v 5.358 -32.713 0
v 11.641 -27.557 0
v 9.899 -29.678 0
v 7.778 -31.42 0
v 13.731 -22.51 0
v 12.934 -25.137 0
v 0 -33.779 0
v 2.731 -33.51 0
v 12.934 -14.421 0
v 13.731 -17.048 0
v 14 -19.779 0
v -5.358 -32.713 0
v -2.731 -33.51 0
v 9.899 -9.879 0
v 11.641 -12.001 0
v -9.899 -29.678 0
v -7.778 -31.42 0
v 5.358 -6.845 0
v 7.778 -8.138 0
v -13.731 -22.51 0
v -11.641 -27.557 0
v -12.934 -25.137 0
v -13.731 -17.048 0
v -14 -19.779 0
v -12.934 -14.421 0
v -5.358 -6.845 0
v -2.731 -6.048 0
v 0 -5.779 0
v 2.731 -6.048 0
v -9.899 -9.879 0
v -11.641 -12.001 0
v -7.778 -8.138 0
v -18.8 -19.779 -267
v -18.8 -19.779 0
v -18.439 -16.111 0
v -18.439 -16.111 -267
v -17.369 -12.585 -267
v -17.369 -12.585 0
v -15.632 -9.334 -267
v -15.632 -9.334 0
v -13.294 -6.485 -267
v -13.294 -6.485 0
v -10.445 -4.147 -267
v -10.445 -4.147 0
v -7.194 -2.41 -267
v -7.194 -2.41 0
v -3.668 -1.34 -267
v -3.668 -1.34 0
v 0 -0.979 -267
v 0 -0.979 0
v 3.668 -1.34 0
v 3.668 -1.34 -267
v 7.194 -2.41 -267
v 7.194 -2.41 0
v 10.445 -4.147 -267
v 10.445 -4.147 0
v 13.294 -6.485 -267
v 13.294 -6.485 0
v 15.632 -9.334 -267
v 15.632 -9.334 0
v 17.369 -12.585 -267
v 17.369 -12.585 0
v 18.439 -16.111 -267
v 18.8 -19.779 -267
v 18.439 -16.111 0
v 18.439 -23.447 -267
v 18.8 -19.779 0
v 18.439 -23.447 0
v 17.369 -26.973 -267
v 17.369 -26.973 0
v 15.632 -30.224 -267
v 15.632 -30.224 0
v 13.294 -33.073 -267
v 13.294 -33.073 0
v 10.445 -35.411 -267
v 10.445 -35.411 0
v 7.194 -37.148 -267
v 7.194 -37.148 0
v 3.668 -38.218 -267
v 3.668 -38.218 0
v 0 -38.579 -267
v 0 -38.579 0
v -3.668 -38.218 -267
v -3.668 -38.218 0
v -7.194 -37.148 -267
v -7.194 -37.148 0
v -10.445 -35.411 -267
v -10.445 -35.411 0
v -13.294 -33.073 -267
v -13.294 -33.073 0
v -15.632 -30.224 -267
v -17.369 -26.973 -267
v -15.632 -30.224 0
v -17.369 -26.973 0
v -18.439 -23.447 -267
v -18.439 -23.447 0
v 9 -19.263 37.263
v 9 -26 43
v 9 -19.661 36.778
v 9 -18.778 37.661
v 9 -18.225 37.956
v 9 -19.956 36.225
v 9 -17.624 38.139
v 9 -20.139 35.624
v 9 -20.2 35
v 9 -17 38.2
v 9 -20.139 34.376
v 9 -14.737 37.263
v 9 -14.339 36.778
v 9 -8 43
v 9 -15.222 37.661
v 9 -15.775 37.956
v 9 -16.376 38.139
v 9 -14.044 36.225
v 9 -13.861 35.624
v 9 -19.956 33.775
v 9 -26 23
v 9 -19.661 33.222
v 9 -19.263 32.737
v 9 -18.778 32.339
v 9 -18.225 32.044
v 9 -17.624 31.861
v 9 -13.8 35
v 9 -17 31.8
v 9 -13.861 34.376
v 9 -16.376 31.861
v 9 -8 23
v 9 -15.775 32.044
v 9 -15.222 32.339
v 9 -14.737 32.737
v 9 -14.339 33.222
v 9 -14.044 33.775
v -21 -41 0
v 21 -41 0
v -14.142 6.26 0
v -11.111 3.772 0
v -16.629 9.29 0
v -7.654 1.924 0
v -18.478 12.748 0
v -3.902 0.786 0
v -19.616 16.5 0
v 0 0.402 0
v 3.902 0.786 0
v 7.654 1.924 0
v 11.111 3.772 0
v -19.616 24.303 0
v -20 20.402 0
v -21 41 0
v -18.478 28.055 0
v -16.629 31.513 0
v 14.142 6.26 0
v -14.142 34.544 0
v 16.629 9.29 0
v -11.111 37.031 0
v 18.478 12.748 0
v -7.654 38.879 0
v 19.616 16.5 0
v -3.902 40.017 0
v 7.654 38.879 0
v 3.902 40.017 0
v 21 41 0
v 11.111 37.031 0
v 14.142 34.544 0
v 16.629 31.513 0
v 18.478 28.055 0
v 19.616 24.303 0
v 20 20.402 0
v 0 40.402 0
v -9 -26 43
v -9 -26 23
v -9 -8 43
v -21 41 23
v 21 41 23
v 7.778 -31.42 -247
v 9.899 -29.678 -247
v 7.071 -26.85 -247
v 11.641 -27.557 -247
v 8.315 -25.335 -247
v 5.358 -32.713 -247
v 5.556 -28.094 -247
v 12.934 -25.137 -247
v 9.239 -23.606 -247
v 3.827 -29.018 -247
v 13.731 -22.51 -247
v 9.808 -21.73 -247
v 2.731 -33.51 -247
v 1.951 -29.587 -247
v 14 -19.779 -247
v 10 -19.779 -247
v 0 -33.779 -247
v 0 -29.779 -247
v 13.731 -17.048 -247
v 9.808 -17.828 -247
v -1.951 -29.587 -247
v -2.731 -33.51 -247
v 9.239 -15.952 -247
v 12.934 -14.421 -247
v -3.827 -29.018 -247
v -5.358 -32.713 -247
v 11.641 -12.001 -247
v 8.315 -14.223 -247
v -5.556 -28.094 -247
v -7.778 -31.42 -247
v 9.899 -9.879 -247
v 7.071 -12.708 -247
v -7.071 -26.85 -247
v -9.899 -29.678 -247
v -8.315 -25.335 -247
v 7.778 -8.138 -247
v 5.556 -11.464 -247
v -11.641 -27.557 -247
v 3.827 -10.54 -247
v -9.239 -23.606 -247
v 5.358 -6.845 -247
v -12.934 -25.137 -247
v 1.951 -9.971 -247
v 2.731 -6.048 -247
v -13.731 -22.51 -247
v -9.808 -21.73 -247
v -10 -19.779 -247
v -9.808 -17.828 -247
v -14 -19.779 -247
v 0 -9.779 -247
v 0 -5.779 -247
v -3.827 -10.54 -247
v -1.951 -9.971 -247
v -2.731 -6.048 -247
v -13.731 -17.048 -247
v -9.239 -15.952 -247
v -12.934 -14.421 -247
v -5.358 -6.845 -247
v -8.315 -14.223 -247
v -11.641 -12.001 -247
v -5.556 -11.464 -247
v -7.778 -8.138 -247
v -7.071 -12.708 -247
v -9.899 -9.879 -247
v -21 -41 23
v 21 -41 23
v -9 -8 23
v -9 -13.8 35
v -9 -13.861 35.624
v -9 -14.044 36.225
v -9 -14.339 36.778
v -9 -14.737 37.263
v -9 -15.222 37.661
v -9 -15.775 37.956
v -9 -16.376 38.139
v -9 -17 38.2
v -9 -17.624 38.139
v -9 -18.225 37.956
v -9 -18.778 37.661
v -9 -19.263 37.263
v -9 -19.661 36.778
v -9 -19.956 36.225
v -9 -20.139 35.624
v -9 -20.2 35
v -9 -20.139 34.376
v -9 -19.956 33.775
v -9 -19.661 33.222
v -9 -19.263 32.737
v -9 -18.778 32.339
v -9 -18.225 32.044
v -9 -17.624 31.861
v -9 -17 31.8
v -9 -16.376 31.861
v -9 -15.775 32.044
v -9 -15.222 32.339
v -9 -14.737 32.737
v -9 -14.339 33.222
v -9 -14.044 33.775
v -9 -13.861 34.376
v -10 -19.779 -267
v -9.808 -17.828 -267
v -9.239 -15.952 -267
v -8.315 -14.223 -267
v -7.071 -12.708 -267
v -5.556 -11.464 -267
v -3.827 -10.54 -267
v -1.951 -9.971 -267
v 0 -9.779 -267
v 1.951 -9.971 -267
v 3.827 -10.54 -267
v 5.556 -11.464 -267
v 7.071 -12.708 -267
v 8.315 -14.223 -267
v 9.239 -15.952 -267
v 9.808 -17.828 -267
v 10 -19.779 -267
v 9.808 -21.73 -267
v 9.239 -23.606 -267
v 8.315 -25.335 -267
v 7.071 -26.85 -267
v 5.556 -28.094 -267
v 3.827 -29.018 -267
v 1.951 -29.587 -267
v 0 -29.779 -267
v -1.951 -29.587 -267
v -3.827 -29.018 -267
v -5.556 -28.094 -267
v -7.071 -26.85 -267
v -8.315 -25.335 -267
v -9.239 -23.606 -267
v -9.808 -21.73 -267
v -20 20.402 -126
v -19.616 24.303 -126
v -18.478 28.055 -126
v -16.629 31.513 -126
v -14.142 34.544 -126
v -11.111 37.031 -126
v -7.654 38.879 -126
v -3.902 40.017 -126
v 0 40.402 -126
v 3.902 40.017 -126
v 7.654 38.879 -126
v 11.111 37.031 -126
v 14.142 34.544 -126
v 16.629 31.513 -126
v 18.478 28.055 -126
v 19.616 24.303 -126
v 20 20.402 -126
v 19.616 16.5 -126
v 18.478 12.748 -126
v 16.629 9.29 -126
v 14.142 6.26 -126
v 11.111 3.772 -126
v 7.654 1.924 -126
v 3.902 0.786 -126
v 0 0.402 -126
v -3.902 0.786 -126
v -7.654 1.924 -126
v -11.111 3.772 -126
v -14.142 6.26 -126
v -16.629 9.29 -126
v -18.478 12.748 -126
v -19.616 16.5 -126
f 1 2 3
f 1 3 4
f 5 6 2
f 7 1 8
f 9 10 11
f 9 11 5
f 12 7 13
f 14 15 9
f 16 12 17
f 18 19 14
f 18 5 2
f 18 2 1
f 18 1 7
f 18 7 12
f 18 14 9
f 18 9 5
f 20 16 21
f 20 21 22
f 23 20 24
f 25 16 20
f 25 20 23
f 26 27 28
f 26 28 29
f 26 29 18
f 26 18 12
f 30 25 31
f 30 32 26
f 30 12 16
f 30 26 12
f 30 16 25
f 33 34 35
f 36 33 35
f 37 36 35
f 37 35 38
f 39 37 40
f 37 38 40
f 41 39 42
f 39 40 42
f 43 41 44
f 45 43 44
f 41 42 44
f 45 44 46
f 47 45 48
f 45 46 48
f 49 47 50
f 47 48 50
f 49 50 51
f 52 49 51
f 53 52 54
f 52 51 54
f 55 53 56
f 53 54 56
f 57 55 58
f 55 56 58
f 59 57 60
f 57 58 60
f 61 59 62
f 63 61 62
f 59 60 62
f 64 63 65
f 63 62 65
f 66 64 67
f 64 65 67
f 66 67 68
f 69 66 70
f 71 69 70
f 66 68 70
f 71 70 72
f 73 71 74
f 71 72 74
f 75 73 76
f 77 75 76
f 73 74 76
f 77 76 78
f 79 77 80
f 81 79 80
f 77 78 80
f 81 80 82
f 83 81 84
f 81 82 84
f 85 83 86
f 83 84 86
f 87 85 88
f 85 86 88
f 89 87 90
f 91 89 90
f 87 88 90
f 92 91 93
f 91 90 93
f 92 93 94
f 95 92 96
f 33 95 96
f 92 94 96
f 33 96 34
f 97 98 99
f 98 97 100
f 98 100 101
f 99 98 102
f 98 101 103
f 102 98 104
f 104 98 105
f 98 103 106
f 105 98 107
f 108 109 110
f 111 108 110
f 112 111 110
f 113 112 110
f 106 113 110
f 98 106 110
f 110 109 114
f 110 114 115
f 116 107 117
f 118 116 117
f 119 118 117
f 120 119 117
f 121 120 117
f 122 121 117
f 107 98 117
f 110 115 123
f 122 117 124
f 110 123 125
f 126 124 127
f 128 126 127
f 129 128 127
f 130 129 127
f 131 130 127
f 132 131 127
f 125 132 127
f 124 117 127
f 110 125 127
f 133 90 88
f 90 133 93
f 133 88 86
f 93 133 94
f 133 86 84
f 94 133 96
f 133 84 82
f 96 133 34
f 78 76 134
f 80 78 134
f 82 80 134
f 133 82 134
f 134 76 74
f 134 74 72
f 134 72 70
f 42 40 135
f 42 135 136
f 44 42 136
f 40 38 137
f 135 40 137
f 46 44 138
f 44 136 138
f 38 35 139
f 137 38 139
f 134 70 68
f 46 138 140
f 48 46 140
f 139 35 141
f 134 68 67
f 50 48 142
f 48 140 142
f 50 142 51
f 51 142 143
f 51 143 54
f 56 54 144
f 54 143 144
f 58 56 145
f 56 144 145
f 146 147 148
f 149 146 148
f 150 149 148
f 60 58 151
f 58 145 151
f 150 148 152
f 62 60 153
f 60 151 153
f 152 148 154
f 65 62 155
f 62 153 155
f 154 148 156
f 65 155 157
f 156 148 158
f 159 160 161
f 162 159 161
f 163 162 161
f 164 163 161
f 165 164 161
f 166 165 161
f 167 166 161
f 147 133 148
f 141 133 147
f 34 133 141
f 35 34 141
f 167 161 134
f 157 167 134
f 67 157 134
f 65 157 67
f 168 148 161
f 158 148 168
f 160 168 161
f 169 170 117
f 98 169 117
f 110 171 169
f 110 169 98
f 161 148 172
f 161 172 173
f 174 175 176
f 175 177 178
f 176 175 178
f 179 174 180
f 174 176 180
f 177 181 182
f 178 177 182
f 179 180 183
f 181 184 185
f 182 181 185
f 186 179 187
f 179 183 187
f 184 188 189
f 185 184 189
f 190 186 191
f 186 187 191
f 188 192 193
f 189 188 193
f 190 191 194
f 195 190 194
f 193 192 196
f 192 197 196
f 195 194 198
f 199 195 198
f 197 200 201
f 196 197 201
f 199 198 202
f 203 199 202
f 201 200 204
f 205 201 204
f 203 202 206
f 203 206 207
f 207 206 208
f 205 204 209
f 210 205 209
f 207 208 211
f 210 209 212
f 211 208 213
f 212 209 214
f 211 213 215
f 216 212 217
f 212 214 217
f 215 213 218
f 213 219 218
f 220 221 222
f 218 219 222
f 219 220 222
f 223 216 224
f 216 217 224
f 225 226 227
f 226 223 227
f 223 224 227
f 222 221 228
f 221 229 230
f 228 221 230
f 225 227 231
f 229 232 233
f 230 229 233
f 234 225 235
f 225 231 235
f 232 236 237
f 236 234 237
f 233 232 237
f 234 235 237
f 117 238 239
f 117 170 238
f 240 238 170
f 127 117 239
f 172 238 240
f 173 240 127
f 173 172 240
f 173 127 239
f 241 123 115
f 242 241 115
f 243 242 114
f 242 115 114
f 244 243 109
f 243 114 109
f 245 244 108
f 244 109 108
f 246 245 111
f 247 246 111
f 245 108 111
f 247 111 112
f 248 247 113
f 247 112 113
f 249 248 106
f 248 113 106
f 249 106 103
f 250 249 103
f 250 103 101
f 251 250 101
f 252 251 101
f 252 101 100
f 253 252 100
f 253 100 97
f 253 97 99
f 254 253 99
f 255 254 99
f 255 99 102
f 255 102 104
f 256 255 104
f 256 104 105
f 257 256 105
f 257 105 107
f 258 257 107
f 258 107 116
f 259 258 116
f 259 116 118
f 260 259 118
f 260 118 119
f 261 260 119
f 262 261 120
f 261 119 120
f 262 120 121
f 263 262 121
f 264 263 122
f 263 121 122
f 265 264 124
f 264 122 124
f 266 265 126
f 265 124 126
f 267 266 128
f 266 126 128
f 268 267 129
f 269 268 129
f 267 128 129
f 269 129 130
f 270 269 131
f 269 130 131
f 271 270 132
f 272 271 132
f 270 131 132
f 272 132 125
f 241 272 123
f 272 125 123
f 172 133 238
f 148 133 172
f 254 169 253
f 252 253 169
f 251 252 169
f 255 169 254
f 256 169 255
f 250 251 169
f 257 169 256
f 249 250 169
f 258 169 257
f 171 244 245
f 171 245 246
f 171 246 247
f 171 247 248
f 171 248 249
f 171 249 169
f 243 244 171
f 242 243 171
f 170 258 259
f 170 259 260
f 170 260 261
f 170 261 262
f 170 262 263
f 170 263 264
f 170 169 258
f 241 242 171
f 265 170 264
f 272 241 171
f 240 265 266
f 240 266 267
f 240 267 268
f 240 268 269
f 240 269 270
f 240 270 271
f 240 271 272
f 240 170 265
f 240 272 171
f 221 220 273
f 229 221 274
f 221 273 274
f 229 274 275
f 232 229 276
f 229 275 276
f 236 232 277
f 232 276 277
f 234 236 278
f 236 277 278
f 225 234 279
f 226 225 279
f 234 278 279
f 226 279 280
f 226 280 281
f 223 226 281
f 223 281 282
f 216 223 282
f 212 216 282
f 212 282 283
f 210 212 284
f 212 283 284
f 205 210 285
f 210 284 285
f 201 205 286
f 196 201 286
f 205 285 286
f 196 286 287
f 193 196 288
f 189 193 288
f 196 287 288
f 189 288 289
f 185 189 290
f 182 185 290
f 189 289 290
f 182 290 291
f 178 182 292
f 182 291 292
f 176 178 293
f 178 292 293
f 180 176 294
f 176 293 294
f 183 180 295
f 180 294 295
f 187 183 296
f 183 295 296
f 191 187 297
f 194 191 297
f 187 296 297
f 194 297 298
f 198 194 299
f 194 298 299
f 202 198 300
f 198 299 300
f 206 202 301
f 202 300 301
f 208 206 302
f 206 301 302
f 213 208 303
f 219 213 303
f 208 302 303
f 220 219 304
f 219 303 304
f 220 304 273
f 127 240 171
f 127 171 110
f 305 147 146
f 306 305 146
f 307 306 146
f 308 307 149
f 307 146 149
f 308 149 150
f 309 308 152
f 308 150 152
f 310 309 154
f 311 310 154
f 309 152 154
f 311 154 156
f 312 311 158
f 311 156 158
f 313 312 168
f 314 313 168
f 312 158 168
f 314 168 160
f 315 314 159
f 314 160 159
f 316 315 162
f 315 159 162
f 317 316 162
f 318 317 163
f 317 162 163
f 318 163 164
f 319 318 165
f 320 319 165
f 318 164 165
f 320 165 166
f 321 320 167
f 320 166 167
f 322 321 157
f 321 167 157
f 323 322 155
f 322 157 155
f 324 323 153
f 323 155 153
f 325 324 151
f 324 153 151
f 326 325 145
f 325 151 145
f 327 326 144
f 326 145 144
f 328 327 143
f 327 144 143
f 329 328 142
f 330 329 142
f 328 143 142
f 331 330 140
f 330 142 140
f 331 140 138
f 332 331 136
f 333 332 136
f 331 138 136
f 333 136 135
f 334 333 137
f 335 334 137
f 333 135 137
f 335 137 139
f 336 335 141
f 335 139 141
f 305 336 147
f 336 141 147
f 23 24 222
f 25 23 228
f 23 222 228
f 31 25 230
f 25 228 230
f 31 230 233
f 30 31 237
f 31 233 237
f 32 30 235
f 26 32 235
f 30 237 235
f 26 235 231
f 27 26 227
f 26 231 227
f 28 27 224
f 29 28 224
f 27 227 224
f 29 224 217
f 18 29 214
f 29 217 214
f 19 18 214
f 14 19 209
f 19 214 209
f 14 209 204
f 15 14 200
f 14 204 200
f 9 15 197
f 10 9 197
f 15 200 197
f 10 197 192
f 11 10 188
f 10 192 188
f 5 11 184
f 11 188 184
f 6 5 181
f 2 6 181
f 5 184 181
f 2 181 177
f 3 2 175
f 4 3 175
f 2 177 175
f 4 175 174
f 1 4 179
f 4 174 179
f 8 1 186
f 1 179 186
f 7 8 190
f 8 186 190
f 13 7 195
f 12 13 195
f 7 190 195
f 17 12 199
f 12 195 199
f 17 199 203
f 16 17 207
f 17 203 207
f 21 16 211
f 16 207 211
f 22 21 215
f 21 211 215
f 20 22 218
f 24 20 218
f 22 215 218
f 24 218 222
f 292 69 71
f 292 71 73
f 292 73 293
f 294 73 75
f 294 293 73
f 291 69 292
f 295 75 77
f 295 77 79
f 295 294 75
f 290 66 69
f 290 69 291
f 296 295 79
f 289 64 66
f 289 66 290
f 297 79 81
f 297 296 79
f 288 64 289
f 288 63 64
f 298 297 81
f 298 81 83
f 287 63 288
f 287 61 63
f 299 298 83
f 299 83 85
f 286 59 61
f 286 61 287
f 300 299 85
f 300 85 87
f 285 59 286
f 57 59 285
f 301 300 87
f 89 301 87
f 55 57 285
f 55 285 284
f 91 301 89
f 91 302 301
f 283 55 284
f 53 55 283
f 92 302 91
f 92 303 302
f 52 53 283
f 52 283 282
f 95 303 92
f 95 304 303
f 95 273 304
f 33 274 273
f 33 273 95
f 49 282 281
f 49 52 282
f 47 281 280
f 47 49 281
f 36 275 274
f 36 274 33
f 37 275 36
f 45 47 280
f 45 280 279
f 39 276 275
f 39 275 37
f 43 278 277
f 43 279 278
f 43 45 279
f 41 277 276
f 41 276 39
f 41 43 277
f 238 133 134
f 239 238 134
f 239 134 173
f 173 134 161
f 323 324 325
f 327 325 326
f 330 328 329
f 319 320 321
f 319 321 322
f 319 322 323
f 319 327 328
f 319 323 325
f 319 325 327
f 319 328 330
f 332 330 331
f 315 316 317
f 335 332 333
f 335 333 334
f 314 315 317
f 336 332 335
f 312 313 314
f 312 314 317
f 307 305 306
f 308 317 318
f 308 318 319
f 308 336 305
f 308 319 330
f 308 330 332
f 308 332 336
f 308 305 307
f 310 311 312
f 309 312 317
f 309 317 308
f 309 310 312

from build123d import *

# Parameters (mm, degrees)
SKETCH1_W           = 42
SKETCH1_H           = 82
BOSS_EXTRUDE1_DEPTH = 23
SKETCH2_W           = 18
SKETCH2_H           = 18
BOSS_EXTRUDE2_DEPTH = 20
SKETCH3_R           = 3.2
CUT_EXTRUDE1_DEPTH  = 21
SKETCH4_R           = 18.8
BOSS_EXTRUDE3_DEPTH = 267
SKETCH5_R           = 20
BOSS_EXTRUDE4_DEPTH = 126
SKETCH6_R           = 10
CUT_EXTRUDE2_DEPTH  = 20
SKETCH7_R           = 14
CUT_EXTRUDE5_DEPTH  = 247


with BuildPart() as part:
    # Sketch1 → Boss-Extrude1 (new body)
    with BuildSketch(Plane.XY):
        Rectangle(SKETCH1_W, SKETCH1_H)
    extrude(amount=BOSS_EXTRUDE1_DEPTH)

    # Sketch2 → Boss-Extrude2 (add)
    with BuildSketch(Plane.XY.offset(23)):
        with Locations((0, -17)):
            Rectangle(SKETCH2_W, SKETCH2_H)
    extrude(amount=BOSS_EXTRUDE2_DEPTH)

    # Sketch3 → Cut-Extrude1 (cut)
    with BuildSketch(Plane(origin=(9, 0, 0), x_dir=(0, 0, -1), z_dir=(1, 0, 0))):
        with Locations(Location((-35, -17, 0), (0, 0, 90))):
            Circle(SKETCH3_R)
    extrude(amount=-CUT_EXTRUDE1_DEPTH, mode=Mode.SUBTRACT)

    # Sketch4 → Boss-Extrude3 (add)
    with BuildSketch(Plane(origin=(0, 0, 0), x_dir=(-1, 0, 0), z_dir=(0, 0, -1))):
        with Locations((0, -19.778983504)):
            Circle(SKETCH4_R)
    extrude(amount=BOSS_EXTRUDE3_DEPTH)

    # Sketch5 → Boss-Extrude4 (add)
    with BuildSketch(Plane(origin=(0, 0, 0), x_dir=(-1, 0, 0), z_dir=(0, 0, -1))):
        with Locations((0, 20.401687075)):
            Circle(SKETCH5_R)
    extrude(amount=BOSS_EXTRUDE4_DEPTH)

    # Sketch6 → Cut-Extrude2 (cut)
    with BuildSketch(Plane(origin=(0, 0, -267), x_dir=(-1, 0, 0), z_dir=(0, 0, -1))):
        with Locations((0, -19.778983504)):
            Circle(SKETCH6_R)
    extrude(amount=-CUT_EXTRUDE2_DEPTH, mode=Mode.SUBTRACT)

    # Sketch7 → Cut-Extrude5 (cut)
    with BuildSketch(Plane(origin=(0, 0, -247), x_dir=(-1, 0, 0), z_dir=(0, 0, -1))):
        with Locations((0, -19.778983504)):
            Circle(SKETCH7_R)
    extrude(amount=-CUT_EXTRUDE5_DEPTH, mode=Mode.SUBTRACT)


solid = part.part
